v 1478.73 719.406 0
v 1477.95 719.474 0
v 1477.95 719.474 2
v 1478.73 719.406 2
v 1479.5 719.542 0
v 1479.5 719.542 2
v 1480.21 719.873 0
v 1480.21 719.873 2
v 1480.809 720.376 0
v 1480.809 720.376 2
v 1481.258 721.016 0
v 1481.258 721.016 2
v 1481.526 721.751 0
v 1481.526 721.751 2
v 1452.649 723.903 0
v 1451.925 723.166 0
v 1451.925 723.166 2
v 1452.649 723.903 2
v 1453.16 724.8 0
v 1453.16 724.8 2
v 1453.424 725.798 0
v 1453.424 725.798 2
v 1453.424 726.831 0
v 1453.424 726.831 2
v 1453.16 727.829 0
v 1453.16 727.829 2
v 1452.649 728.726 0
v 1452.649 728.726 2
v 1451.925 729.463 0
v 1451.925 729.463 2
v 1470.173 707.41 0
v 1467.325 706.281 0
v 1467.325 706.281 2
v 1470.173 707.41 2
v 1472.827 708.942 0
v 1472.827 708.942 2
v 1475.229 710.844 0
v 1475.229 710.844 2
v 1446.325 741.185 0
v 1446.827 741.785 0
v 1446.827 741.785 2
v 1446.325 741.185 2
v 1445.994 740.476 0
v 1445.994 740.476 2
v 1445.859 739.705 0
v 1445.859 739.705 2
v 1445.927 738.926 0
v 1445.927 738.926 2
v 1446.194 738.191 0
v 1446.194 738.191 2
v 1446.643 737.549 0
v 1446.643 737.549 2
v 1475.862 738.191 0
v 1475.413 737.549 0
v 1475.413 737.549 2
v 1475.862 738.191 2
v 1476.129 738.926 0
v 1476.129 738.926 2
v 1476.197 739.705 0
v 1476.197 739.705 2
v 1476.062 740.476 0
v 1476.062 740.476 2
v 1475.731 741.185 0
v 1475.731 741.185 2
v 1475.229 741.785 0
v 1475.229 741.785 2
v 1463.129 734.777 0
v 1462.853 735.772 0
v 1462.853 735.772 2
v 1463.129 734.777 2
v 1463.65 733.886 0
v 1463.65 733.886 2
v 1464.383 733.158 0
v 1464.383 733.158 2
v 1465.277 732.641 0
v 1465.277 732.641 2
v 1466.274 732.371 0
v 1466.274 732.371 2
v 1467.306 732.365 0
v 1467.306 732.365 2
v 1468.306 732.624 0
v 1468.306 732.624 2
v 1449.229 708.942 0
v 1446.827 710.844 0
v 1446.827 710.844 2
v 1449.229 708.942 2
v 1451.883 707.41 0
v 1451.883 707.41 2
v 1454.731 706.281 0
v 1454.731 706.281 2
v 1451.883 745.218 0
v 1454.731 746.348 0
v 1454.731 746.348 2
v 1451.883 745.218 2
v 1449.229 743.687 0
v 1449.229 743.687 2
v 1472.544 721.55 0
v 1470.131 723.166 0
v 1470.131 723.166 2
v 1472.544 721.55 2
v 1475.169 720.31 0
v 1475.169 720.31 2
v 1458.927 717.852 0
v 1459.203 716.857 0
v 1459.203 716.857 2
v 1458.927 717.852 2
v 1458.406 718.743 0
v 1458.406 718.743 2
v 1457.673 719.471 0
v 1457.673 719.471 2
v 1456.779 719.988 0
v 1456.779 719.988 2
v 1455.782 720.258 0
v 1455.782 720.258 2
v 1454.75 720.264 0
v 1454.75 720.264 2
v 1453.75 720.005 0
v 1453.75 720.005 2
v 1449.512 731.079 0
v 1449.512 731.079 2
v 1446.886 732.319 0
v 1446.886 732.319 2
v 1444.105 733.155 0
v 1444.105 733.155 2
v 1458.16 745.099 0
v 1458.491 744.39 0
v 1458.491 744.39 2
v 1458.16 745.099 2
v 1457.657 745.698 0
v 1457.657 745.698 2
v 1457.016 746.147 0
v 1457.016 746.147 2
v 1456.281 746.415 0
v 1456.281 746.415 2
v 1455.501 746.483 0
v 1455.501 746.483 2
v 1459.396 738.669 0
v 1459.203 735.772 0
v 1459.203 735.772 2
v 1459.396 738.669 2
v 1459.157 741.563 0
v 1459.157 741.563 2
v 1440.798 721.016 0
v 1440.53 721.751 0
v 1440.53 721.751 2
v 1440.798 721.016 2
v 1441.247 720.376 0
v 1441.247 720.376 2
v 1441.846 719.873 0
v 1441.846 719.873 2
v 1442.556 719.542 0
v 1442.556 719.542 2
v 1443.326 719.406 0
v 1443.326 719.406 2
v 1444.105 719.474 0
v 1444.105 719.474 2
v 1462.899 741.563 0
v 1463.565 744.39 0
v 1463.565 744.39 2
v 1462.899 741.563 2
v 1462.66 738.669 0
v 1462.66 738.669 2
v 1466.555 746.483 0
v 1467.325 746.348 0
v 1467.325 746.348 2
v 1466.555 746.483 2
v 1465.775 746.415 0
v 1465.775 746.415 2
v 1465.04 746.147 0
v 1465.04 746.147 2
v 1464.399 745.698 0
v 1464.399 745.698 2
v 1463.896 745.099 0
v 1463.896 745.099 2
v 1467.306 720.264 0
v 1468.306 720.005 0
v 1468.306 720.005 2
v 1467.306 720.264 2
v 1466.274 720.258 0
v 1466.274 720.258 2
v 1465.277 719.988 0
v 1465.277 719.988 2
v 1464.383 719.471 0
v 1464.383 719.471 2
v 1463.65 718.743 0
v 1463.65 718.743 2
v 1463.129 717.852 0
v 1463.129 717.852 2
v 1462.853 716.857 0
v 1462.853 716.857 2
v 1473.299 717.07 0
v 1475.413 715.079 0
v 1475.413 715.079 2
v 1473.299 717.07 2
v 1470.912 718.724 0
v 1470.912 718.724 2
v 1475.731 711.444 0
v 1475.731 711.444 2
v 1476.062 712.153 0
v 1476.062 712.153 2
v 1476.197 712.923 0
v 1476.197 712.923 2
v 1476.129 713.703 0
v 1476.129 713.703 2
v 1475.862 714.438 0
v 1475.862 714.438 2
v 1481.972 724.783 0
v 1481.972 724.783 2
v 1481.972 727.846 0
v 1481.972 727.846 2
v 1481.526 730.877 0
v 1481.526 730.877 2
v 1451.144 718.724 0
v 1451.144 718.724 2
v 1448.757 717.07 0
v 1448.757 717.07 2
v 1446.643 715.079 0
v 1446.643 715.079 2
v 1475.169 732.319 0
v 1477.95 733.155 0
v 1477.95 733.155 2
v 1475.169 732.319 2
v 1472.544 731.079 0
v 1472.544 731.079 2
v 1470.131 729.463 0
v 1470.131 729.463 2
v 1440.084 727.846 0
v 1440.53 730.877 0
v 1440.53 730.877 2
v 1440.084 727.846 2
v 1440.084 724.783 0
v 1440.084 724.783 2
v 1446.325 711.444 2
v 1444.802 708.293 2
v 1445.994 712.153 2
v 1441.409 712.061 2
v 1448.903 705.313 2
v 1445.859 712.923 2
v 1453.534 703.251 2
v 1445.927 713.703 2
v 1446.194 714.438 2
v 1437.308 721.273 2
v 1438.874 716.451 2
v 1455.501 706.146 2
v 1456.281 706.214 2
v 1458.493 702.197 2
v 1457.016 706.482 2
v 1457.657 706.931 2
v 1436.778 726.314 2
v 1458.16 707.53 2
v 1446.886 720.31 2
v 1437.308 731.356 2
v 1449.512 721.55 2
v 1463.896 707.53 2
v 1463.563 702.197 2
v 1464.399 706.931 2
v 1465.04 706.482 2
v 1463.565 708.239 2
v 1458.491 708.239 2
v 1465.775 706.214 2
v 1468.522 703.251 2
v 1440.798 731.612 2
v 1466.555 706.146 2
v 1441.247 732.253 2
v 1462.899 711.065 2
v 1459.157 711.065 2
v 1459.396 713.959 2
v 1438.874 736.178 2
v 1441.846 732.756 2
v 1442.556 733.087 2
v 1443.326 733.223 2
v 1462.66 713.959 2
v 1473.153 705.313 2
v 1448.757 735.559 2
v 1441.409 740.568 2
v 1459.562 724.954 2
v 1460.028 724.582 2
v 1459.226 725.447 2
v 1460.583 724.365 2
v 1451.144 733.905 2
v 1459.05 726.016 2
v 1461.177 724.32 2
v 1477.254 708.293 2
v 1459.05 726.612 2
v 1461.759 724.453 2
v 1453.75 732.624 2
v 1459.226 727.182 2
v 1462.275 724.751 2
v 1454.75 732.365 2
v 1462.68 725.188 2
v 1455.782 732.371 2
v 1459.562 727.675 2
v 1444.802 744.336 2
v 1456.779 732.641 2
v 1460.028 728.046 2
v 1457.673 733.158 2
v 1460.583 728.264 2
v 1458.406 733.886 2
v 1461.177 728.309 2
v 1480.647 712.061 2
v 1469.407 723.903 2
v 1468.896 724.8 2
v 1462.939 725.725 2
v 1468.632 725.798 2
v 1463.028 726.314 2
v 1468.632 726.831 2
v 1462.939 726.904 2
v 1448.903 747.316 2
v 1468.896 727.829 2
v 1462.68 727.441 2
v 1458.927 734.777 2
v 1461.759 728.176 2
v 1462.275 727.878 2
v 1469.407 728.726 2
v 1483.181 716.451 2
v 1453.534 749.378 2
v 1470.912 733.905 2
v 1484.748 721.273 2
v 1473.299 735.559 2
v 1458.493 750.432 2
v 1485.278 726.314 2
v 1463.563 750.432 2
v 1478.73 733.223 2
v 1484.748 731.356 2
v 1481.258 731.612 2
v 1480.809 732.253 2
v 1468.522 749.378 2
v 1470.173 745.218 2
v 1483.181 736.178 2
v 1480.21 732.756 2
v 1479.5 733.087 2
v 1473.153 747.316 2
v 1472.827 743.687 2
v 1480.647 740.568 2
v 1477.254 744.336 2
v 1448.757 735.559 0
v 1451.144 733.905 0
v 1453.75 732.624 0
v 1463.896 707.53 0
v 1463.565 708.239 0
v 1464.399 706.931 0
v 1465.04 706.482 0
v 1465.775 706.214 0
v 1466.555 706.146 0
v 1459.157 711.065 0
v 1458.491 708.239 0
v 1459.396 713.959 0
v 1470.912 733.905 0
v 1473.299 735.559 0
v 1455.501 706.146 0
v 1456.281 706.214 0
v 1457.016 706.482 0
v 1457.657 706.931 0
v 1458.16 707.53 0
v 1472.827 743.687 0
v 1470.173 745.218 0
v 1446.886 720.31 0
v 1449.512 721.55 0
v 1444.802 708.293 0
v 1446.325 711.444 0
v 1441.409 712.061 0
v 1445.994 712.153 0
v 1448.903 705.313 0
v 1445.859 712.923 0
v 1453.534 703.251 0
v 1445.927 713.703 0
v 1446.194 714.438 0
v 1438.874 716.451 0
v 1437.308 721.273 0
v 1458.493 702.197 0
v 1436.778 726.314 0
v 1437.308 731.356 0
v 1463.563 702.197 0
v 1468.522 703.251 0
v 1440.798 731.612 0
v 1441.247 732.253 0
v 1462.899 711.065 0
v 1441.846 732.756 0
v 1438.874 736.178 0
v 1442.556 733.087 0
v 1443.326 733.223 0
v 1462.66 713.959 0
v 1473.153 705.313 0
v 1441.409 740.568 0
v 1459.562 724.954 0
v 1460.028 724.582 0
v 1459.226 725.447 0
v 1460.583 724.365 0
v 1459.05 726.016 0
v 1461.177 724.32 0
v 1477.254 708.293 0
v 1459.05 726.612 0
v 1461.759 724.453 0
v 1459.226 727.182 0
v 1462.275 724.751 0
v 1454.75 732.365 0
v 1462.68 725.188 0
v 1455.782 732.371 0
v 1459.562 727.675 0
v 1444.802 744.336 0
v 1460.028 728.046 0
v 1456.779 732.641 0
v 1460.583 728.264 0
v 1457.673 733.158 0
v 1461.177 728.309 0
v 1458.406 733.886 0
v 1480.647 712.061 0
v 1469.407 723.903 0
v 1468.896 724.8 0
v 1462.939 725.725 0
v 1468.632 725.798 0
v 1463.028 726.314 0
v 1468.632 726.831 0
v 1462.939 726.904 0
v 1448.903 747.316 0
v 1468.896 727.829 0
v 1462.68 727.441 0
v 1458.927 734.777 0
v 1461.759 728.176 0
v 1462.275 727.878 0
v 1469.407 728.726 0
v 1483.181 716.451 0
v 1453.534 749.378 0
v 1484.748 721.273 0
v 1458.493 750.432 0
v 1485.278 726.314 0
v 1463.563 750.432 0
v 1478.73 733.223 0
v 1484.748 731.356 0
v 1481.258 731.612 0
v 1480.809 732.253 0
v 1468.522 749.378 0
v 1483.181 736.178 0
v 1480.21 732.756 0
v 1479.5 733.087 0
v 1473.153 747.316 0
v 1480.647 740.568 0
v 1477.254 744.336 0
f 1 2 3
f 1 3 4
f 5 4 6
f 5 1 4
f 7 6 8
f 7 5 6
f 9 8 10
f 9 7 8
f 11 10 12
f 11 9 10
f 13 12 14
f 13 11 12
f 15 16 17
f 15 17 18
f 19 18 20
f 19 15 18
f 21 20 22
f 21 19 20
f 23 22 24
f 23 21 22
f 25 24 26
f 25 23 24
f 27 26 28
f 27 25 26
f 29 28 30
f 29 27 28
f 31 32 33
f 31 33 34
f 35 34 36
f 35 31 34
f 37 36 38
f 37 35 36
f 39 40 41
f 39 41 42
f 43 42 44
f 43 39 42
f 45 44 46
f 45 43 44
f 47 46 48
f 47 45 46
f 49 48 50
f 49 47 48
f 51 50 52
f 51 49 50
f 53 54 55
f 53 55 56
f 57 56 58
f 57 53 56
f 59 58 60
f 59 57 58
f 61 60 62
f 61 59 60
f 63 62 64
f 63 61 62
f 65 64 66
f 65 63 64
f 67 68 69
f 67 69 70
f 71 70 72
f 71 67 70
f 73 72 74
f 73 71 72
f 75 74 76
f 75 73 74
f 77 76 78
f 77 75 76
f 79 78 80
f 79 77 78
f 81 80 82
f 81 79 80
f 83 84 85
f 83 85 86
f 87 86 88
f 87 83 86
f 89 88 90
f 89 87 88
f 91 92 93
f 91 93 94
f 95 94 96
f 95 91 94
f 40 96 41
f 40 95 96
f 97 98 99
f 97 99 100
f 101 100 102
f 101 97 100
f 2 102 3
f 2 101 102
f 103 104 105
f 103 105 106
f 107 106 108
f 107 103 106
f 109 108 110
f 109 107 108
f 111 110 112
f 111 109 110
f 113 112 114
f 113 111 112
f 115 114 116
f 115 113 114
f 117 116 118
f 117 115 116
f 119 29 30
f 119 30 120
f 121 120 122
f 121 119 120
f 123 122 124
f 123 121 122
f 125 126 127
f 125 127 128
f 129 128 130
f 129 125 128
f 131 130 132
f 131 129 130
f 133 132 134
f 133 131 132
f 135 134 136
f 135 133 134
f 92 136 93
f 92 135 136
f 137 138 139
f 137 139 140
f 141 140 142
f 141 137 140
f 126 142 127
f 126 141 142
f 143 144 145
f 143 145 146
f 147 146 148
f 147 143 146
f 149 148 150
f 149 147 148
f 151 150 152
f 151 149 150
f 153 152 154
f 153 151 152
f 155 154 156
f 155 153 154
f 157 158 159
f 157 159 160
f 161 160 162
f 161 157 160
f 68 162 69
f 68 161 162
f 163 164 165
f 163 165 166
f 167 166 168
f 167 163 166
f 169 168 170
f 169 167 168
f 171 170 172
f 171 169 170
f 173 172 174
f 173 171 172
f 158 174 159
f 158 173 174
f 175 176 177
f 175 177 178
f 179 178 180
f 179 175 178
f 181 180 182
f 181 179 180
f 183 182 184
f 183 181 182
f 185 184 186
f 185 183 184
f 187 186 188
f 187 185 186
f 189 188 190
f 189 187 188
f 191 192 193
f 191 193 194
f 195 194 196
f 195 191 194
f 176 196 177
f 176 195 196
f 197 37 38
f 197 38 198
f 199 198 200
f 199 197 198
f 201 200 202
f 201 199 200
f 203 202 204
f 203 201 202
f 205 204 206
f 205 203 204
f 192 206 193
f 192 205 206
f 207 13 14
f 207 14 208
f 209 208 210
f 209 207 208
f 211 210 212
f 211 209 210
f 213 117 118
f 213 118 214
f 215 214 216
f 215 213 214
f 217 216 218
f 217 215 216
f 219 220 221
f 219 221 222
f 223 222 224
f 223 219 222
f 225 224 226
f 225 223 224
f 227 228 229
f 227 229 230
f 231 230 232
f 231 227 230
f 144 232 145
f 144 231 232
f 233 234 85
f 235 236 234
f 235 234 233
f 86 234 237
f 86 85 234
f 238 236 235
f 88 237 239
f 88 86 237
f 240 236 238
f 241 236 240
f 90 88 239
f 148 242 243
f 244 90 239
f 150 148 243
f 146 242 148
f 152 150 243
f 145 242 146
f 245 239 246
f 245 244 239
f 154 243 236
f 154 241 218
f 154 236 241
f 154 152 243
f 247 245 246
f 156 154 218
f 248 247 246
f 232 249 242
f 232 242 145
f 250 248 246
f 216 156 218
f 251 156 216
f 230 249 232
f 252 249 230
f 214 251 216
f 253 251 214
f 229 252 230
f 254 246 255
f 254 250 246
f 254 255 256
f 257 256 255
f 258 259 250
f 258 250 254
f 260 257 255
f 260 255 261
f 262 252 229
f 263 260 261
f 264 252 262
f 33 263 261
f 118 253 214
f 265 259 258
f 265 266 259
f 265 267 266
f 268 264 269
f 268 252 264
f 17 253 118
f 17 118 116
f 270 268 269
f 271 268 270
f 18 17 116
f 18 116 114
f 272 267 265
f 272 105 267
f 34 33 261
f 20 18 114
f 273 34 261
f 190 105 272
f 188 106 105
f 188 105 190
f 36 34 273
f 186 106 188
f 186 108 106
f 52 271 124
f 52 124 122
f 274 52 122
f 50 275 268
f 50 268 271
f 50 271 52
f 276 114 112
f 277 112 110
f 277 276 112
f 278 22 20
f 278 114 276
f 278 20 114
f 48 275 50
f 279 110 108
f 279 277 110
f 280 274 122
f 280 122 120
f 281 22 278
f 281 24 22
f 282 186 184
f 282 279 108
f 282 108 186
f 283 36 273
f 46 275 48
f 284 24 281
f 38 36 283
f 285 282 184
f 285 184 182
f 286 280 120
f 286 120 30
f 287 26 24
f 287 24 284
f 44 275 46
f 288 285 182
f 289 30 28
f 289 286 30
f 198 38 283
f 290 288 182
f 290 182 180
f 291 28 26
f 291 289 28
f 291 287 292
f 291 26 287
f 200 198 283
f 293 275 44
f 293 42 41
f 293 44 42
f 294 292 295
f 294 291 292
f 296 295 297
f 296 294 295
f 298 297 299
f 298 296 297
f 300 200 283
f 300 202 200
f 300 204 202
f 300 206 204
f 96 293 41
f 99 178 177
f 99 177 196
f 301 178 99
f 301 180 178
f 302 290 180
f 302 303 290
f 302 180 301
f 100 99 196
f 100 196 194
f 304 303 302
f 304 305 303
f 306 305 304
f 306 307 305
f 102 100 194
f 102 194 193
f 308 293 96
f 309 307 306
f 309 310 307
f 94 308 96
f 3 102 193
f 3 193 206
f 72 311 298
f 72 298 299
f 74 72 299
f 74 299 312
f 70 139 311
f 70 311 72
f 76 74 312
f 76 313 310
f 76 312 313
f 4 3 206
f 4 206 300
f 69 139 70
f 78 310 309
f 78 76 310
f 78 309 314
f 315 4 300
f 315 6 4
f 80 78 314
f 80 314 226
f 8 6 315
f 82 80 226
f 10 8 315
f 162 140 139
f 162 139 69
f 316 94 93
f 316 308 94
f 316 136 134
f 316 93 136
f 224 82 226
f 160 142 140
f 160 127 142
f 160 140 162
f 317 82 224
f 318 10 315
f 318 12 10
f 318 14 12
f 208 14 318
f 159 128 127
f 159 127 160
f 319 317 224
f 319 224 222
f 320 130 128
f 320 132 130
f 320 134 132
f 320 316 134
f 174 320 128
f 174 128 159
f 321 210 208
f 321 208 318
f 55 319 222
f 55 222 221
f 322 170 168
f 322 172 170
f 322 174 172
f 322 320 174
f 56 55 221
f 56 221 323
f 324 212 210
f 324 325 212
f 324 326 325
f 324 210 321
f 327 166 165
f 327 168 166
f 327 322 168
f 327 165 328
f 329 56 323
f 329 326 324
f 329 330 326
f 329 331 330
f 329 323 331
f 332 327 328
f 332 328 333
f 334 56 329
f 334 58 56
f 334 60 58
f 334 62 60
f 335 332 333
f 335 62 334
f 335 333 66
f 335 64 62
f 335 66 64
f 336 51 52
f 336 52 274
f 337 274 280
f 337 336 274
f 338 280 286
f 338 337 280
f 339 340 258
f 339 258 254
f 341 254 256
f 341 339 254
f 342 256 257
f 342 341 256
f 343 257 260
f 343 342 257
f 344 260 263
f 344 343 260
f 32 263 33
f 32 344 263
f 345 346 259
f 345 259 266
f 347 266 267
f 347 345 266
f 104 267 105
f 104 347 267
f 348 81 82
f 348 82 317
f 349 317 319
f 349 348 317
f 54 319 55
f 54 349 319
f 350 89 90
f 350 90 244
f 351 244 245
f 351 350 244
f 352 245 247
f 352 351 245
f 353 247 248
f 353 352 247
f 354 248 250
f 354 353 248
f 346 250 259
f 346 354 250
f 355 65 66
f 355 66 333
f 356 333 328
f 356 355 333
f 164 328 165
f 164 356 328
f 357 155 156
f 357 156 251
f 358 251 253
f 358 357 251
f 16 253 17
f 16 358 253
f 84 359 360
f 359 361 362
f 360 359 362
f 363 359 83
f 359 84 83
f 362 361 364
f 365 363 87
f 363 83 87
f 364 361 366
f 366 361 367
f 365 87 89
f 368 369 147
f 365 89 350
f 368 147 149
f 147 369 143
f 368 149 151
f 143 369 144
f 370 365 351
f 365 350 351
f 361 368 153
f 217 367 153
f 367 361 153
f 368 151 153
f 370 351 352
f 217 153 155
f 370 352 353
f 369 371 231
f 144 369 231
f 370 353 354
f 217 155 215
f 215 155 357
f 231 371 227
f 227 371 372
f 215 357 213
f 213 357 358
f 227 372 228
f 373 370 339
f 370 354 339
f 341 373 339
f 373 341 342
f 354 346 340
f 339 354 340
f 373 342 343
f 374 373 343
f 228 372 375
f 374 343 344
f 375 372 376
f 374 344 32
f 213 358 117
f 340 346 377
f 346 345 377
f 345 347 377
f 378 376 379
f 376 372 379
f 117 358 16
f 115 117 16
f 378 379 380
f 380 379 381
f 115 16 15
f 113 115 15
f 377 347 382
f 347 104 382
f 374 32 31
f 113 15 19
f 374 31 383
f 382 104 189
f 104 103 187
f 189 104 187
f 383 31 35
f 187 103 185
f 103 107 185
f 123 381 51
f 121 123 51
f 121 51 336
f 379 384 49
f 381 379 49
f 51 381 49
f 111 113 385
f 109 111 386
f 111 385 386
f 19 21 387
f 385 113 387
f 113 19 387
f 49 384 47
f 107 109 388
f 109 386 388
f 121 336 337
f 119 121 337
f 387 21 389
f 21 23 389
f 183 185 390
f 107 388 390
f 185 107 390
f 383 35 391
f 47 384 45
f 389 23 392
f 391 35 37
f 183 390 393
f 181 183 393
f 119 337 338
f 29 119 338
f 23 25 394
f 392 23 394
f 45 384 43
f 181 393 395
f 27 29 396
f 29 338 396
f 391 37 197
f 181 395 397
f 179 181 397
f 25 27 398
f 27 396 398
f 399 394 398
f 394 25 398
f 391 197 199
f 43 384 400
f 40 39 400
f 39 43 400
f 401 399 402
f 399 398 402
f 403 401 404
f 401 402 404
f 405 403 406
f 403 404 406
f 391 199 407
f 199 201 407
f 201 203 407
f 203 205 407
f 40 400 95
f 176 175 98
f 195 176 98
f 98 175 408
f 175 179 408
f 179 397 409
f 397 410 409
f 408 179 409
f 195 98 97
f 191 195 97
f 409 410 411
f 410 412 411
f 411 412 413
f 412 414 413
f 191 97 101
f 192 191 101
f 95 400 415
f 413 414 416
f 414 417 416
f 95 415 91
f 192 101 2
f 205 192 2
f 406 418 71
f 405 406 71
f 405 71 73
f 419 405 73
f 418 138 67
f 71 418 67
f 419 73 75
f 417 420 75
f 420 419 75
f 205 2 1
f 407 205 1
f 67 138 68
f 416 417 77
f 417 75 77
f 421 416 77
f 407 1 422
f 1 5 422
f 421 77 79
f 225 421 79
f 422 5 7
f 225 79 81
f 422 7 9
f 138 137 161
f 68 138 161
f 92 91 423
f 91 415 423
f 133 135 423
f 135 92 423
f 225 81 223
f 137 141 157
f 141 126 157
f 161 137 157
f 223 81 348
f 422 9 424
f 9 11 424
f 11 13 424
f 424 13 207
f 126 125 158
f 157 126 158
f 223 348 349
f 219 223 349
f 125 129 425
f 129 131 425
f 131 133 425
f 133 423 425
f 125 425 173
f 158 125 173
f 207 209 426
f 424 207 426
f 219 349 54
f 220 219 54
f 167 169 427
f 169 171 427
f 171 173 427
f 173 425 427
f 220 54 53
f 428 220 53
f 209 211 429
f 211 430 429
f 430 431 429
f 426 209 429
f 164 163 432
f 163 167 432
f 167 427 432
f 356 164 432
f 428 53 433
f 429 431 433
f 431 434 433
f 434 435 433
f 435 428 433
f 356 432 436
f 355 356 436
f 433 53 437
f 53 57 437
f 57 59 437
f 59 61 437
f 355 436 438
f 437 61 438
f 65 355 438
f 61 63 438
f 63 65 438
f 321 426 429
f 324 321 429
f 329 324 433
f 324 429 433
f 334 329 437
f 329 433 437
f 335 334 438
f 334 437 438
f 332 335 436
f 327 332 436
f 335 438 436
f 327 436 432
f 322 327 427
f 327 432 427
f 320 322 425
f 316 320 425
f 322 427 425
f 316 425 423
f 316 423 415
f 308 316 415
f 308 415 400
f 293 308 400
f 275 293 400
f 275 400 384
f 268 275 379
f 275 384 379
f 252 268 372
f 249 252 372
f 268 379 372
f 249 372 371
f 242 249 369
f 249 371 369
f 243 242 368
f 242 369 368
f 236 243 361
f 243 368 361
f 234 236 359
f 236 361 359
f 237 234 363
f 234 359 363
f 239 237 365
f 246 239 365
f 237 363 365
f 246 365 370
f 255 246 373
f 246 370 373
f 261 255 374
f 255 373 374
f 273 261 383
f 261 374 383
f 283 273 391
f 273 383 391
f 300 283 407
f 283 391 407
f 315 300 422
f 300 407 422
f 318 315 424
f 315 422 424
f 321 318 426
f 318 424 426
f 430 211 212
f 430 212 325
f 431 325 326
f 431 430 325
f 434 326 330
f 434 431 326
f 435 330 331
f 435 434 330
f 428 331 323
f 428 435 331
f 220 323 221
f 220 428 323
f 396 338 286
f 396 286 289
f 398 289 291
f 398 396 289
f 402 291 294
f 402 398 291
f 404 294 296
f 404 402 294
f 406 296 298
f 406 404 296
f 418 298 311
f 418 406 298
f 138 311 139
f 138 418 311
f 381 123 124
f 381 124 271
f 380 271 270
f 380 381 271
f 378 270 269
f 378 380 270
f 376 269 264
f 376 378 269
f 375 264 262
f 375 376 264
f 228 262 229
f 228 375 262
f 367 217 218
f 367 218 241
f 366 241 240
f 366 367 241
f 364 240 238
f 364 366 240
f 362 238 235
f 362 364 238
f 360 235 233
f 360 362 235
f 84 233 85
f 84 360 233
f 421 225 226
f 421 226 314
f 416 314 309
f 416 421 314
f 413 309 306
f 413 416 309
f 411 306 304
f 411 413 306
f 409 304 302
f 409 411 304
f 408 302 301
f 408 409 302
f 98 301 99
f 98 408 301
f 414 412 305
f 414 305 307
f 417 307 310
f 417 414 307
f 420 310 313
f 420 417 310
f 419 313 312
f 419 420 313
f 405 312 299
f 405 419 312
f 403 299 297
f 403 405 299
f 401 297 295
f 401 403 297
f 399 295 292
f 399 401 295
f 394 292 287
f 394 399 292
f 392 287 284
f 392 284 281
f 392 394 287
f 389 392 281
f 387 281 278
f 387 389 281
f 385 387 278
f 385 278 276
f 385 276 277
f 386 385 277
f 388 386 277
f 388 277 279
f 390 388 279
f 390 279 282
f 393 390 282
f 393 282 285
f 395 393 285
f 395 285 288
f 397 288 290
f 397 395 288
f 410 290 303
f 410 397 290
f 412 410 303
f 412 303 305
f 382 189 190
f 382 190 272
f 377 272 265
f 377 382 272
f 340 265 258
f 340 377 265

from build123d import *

# Parameters (mm, degrees)
MODEL_R         = 24.25
MODEL_R_2       = 2
EXTRUDE_1_DEPTH = 2


with BuildPart() as part:
    # Model → 凸台-拉伸1 (new body)
    with BuildSketch(Plane.XY):
        with Locations((1461.027973693, 726.314415121)):
            Circle(MODEL_R)
        with Locations((1461.027973693, 726.314415121)):
            Circle(MODEL_R_2, mode=Mode.SUBTRACT)
        with BuildLine():
            ThreePointArc((1454.730507071, 746.347934885), (1450.527973693, 744.5009486), (1446.827169961, 741.784941077))
            ThreePointArc((1446.827169961, 741.784941077), (1445.858696219, 739.705372638), (1446.642743938, 737.549493362))
            ThreePointArc((1446.642743938, 737.549493362), (1449.919857233, 734.687570493), (1453.749968469, 732.623515752))
            ThreePointArc((1453.749968469, 732.623515752), (1457.242892618, 732.870367853), (1459.203134883, 735.771902849))
            ThreePointArc((1459.203134883, 735.771902849), (1459.33066666, 740.120903849), (1458.490725399, 744.389928648))
            ThreePointArc((1458.490725399, 744.389928648), (1457.015703038, 746.146873529), (1454.730507071, 746.347934885))
        make_face(mode=Mode.SUBTRACT)
        with BuildLine():
            ThreePointArc((1440.529703339, 730.877408929), (1440.027973693, 726.314415121), (1440.529703339, 721.751421313))
            ThreePointArc((1440.529703339, 721.751421313), (1441.846425564, 719.87291423), (1444.105495645, 719.473979835))
            ThreePointArc((1444.105495645, 719.473979835), (1448.222550201, 720.881081765), (1451.925129659, 723.166028024))
            ThreePointArc((1451.925129659, 723.166028024), (1453.457811542, 726.314415121), (1451.925129659, 729.462802217))
            ThreePointArc((1451.925129659, 729.462802217), (1448.222550201, 731.747748477), (1444.105495645, 733.154850407))
            ThreePointArc((1444.105495645, 733.154850407), (1441.846425564, 732.755916011), (1440.529703339, 730.877408929))
        make_face(mode=Mode.SUBTRACT)
        with BuildLine():
            ThreePointArc((1446.827169961, 710.843889164), (1450.527973693, 708.127881641), (1454.730507071, 706.280895356))
            ThreePointArc((1454.730507071, 706.280895356), (1457.015703038, 706.481956712), (1458.490725399, 708.238901593))
            ThreePointArc((1458.490725399, 708.238901593), (1459.33066666, 712.507926392), (1459.203134883, 716.856927392))
            ThreePointArc((1459.203134883, 716.856927392), (1457.242892618, 719.758462388), (1453.749968469, 720.005314489))
            ThreePointArc((1453.749968469, 720.005314489), (1449.919857233, 717.941259748), (1446.642743938, 715.079336879))
            ThreePointArc((1446.642743938, 715.079336879), (1445.858696219, 712.923457603), (1446.827169961, 710.843889164))
        make_face(mode=Mode.SUBTRACT)
        with BuildLine():
            ThreePointArc((1467.325440315, 706.280895356), (1471.527973693, 708.127881641), (1475.228777425, 710.843889164))
            ThreePointArc((1475.228777425, 710.843889164), (1476.197251167, 712.923457603), (1475.413203447, 715.079336879))
            ThreePointArc((1475.413203447, 715.079336879), (1472.136090152, 717.941259748), (1468.305978916, 720.005314489))
            ThreePointArc((1468.305978916, 720.005314489), (1464.813054768, 719.758462388), (1462.852812503, 716.856927392))
            ThreePointArc((1462.852812503, 716.856927392), (1462.725280725, 712.507926392), (1463.565221986, 708.238901593))
            ThreePointArc((1463.565221986, 708.238901593), (1465.040244347, 706.481956712), (1467.325440315, 706.280895356))
        make_face(mode=Mode.SUBTRACT)
        with BuildLine():
            ThreePointArc((1481.526244047, 721.751421313), (1482.027973693, 726.314415121), (1481.526244047, 730.877408929))
            ThreePointArc((1481.526244047, 730.877408929), (1480.209521821, 732.755916011), (1477.950451741, 733.154850407))
            ThreePointArc((1477.950451741, 733.154850407), (1473.833397185, 731.747748477), (1470.130817726, 729.462802217))
            ThreePointArc((1470.130817726, 729.462802217), (1468.598135843, 726.314415121), (1470.130817726, 723.166028024))
            ThreePointArc((1470.130817726, 723.166028024), (1473.833397185, 720.881081765), (1477.950451741, 719.473979835))
            ThreePointArc((1477.950451741, 719.473979835), (1480.209521821, 719.87291423), (1481.526244047, 721.751421313))
        make_face(mode=Mode.SUBTRACT)
        with BuildLine():
            ThreePointArc((1475.228777425, 741.784941077), (1471.527973693, 744.5009486), (1467.325440315, 746.347934885))
            ThreePointArc((1467.325440315, 746.347934885), (1465.040244347, 746.146873529), (1463.565221986, 744.389928648))
            ThreePointArc((1463.565221986, 744.389928648), (1462.725280725, 740.120903849), (1462.852812503, 735.771902849))
            ThreePointArc((1462.852812503, 735.771902849), (1464.813054768, 732.870367853), (1468.305978916, 732.623515752))
            ThreePointArc((1468.305978916, 732.623515752), (1472.136090152, 734.687570493), (1475.413203447, 737.549493362))
            ThreePointArc((1475.413203447, 737.549493362), (1476.197251167, 739.705372638), (1475.228777425, 741.784941077))
        make_face(mode=Mode.SUBTRACT)
    extrude(amount=EXTRUDE_1_DEPTH)


solid = part.part
